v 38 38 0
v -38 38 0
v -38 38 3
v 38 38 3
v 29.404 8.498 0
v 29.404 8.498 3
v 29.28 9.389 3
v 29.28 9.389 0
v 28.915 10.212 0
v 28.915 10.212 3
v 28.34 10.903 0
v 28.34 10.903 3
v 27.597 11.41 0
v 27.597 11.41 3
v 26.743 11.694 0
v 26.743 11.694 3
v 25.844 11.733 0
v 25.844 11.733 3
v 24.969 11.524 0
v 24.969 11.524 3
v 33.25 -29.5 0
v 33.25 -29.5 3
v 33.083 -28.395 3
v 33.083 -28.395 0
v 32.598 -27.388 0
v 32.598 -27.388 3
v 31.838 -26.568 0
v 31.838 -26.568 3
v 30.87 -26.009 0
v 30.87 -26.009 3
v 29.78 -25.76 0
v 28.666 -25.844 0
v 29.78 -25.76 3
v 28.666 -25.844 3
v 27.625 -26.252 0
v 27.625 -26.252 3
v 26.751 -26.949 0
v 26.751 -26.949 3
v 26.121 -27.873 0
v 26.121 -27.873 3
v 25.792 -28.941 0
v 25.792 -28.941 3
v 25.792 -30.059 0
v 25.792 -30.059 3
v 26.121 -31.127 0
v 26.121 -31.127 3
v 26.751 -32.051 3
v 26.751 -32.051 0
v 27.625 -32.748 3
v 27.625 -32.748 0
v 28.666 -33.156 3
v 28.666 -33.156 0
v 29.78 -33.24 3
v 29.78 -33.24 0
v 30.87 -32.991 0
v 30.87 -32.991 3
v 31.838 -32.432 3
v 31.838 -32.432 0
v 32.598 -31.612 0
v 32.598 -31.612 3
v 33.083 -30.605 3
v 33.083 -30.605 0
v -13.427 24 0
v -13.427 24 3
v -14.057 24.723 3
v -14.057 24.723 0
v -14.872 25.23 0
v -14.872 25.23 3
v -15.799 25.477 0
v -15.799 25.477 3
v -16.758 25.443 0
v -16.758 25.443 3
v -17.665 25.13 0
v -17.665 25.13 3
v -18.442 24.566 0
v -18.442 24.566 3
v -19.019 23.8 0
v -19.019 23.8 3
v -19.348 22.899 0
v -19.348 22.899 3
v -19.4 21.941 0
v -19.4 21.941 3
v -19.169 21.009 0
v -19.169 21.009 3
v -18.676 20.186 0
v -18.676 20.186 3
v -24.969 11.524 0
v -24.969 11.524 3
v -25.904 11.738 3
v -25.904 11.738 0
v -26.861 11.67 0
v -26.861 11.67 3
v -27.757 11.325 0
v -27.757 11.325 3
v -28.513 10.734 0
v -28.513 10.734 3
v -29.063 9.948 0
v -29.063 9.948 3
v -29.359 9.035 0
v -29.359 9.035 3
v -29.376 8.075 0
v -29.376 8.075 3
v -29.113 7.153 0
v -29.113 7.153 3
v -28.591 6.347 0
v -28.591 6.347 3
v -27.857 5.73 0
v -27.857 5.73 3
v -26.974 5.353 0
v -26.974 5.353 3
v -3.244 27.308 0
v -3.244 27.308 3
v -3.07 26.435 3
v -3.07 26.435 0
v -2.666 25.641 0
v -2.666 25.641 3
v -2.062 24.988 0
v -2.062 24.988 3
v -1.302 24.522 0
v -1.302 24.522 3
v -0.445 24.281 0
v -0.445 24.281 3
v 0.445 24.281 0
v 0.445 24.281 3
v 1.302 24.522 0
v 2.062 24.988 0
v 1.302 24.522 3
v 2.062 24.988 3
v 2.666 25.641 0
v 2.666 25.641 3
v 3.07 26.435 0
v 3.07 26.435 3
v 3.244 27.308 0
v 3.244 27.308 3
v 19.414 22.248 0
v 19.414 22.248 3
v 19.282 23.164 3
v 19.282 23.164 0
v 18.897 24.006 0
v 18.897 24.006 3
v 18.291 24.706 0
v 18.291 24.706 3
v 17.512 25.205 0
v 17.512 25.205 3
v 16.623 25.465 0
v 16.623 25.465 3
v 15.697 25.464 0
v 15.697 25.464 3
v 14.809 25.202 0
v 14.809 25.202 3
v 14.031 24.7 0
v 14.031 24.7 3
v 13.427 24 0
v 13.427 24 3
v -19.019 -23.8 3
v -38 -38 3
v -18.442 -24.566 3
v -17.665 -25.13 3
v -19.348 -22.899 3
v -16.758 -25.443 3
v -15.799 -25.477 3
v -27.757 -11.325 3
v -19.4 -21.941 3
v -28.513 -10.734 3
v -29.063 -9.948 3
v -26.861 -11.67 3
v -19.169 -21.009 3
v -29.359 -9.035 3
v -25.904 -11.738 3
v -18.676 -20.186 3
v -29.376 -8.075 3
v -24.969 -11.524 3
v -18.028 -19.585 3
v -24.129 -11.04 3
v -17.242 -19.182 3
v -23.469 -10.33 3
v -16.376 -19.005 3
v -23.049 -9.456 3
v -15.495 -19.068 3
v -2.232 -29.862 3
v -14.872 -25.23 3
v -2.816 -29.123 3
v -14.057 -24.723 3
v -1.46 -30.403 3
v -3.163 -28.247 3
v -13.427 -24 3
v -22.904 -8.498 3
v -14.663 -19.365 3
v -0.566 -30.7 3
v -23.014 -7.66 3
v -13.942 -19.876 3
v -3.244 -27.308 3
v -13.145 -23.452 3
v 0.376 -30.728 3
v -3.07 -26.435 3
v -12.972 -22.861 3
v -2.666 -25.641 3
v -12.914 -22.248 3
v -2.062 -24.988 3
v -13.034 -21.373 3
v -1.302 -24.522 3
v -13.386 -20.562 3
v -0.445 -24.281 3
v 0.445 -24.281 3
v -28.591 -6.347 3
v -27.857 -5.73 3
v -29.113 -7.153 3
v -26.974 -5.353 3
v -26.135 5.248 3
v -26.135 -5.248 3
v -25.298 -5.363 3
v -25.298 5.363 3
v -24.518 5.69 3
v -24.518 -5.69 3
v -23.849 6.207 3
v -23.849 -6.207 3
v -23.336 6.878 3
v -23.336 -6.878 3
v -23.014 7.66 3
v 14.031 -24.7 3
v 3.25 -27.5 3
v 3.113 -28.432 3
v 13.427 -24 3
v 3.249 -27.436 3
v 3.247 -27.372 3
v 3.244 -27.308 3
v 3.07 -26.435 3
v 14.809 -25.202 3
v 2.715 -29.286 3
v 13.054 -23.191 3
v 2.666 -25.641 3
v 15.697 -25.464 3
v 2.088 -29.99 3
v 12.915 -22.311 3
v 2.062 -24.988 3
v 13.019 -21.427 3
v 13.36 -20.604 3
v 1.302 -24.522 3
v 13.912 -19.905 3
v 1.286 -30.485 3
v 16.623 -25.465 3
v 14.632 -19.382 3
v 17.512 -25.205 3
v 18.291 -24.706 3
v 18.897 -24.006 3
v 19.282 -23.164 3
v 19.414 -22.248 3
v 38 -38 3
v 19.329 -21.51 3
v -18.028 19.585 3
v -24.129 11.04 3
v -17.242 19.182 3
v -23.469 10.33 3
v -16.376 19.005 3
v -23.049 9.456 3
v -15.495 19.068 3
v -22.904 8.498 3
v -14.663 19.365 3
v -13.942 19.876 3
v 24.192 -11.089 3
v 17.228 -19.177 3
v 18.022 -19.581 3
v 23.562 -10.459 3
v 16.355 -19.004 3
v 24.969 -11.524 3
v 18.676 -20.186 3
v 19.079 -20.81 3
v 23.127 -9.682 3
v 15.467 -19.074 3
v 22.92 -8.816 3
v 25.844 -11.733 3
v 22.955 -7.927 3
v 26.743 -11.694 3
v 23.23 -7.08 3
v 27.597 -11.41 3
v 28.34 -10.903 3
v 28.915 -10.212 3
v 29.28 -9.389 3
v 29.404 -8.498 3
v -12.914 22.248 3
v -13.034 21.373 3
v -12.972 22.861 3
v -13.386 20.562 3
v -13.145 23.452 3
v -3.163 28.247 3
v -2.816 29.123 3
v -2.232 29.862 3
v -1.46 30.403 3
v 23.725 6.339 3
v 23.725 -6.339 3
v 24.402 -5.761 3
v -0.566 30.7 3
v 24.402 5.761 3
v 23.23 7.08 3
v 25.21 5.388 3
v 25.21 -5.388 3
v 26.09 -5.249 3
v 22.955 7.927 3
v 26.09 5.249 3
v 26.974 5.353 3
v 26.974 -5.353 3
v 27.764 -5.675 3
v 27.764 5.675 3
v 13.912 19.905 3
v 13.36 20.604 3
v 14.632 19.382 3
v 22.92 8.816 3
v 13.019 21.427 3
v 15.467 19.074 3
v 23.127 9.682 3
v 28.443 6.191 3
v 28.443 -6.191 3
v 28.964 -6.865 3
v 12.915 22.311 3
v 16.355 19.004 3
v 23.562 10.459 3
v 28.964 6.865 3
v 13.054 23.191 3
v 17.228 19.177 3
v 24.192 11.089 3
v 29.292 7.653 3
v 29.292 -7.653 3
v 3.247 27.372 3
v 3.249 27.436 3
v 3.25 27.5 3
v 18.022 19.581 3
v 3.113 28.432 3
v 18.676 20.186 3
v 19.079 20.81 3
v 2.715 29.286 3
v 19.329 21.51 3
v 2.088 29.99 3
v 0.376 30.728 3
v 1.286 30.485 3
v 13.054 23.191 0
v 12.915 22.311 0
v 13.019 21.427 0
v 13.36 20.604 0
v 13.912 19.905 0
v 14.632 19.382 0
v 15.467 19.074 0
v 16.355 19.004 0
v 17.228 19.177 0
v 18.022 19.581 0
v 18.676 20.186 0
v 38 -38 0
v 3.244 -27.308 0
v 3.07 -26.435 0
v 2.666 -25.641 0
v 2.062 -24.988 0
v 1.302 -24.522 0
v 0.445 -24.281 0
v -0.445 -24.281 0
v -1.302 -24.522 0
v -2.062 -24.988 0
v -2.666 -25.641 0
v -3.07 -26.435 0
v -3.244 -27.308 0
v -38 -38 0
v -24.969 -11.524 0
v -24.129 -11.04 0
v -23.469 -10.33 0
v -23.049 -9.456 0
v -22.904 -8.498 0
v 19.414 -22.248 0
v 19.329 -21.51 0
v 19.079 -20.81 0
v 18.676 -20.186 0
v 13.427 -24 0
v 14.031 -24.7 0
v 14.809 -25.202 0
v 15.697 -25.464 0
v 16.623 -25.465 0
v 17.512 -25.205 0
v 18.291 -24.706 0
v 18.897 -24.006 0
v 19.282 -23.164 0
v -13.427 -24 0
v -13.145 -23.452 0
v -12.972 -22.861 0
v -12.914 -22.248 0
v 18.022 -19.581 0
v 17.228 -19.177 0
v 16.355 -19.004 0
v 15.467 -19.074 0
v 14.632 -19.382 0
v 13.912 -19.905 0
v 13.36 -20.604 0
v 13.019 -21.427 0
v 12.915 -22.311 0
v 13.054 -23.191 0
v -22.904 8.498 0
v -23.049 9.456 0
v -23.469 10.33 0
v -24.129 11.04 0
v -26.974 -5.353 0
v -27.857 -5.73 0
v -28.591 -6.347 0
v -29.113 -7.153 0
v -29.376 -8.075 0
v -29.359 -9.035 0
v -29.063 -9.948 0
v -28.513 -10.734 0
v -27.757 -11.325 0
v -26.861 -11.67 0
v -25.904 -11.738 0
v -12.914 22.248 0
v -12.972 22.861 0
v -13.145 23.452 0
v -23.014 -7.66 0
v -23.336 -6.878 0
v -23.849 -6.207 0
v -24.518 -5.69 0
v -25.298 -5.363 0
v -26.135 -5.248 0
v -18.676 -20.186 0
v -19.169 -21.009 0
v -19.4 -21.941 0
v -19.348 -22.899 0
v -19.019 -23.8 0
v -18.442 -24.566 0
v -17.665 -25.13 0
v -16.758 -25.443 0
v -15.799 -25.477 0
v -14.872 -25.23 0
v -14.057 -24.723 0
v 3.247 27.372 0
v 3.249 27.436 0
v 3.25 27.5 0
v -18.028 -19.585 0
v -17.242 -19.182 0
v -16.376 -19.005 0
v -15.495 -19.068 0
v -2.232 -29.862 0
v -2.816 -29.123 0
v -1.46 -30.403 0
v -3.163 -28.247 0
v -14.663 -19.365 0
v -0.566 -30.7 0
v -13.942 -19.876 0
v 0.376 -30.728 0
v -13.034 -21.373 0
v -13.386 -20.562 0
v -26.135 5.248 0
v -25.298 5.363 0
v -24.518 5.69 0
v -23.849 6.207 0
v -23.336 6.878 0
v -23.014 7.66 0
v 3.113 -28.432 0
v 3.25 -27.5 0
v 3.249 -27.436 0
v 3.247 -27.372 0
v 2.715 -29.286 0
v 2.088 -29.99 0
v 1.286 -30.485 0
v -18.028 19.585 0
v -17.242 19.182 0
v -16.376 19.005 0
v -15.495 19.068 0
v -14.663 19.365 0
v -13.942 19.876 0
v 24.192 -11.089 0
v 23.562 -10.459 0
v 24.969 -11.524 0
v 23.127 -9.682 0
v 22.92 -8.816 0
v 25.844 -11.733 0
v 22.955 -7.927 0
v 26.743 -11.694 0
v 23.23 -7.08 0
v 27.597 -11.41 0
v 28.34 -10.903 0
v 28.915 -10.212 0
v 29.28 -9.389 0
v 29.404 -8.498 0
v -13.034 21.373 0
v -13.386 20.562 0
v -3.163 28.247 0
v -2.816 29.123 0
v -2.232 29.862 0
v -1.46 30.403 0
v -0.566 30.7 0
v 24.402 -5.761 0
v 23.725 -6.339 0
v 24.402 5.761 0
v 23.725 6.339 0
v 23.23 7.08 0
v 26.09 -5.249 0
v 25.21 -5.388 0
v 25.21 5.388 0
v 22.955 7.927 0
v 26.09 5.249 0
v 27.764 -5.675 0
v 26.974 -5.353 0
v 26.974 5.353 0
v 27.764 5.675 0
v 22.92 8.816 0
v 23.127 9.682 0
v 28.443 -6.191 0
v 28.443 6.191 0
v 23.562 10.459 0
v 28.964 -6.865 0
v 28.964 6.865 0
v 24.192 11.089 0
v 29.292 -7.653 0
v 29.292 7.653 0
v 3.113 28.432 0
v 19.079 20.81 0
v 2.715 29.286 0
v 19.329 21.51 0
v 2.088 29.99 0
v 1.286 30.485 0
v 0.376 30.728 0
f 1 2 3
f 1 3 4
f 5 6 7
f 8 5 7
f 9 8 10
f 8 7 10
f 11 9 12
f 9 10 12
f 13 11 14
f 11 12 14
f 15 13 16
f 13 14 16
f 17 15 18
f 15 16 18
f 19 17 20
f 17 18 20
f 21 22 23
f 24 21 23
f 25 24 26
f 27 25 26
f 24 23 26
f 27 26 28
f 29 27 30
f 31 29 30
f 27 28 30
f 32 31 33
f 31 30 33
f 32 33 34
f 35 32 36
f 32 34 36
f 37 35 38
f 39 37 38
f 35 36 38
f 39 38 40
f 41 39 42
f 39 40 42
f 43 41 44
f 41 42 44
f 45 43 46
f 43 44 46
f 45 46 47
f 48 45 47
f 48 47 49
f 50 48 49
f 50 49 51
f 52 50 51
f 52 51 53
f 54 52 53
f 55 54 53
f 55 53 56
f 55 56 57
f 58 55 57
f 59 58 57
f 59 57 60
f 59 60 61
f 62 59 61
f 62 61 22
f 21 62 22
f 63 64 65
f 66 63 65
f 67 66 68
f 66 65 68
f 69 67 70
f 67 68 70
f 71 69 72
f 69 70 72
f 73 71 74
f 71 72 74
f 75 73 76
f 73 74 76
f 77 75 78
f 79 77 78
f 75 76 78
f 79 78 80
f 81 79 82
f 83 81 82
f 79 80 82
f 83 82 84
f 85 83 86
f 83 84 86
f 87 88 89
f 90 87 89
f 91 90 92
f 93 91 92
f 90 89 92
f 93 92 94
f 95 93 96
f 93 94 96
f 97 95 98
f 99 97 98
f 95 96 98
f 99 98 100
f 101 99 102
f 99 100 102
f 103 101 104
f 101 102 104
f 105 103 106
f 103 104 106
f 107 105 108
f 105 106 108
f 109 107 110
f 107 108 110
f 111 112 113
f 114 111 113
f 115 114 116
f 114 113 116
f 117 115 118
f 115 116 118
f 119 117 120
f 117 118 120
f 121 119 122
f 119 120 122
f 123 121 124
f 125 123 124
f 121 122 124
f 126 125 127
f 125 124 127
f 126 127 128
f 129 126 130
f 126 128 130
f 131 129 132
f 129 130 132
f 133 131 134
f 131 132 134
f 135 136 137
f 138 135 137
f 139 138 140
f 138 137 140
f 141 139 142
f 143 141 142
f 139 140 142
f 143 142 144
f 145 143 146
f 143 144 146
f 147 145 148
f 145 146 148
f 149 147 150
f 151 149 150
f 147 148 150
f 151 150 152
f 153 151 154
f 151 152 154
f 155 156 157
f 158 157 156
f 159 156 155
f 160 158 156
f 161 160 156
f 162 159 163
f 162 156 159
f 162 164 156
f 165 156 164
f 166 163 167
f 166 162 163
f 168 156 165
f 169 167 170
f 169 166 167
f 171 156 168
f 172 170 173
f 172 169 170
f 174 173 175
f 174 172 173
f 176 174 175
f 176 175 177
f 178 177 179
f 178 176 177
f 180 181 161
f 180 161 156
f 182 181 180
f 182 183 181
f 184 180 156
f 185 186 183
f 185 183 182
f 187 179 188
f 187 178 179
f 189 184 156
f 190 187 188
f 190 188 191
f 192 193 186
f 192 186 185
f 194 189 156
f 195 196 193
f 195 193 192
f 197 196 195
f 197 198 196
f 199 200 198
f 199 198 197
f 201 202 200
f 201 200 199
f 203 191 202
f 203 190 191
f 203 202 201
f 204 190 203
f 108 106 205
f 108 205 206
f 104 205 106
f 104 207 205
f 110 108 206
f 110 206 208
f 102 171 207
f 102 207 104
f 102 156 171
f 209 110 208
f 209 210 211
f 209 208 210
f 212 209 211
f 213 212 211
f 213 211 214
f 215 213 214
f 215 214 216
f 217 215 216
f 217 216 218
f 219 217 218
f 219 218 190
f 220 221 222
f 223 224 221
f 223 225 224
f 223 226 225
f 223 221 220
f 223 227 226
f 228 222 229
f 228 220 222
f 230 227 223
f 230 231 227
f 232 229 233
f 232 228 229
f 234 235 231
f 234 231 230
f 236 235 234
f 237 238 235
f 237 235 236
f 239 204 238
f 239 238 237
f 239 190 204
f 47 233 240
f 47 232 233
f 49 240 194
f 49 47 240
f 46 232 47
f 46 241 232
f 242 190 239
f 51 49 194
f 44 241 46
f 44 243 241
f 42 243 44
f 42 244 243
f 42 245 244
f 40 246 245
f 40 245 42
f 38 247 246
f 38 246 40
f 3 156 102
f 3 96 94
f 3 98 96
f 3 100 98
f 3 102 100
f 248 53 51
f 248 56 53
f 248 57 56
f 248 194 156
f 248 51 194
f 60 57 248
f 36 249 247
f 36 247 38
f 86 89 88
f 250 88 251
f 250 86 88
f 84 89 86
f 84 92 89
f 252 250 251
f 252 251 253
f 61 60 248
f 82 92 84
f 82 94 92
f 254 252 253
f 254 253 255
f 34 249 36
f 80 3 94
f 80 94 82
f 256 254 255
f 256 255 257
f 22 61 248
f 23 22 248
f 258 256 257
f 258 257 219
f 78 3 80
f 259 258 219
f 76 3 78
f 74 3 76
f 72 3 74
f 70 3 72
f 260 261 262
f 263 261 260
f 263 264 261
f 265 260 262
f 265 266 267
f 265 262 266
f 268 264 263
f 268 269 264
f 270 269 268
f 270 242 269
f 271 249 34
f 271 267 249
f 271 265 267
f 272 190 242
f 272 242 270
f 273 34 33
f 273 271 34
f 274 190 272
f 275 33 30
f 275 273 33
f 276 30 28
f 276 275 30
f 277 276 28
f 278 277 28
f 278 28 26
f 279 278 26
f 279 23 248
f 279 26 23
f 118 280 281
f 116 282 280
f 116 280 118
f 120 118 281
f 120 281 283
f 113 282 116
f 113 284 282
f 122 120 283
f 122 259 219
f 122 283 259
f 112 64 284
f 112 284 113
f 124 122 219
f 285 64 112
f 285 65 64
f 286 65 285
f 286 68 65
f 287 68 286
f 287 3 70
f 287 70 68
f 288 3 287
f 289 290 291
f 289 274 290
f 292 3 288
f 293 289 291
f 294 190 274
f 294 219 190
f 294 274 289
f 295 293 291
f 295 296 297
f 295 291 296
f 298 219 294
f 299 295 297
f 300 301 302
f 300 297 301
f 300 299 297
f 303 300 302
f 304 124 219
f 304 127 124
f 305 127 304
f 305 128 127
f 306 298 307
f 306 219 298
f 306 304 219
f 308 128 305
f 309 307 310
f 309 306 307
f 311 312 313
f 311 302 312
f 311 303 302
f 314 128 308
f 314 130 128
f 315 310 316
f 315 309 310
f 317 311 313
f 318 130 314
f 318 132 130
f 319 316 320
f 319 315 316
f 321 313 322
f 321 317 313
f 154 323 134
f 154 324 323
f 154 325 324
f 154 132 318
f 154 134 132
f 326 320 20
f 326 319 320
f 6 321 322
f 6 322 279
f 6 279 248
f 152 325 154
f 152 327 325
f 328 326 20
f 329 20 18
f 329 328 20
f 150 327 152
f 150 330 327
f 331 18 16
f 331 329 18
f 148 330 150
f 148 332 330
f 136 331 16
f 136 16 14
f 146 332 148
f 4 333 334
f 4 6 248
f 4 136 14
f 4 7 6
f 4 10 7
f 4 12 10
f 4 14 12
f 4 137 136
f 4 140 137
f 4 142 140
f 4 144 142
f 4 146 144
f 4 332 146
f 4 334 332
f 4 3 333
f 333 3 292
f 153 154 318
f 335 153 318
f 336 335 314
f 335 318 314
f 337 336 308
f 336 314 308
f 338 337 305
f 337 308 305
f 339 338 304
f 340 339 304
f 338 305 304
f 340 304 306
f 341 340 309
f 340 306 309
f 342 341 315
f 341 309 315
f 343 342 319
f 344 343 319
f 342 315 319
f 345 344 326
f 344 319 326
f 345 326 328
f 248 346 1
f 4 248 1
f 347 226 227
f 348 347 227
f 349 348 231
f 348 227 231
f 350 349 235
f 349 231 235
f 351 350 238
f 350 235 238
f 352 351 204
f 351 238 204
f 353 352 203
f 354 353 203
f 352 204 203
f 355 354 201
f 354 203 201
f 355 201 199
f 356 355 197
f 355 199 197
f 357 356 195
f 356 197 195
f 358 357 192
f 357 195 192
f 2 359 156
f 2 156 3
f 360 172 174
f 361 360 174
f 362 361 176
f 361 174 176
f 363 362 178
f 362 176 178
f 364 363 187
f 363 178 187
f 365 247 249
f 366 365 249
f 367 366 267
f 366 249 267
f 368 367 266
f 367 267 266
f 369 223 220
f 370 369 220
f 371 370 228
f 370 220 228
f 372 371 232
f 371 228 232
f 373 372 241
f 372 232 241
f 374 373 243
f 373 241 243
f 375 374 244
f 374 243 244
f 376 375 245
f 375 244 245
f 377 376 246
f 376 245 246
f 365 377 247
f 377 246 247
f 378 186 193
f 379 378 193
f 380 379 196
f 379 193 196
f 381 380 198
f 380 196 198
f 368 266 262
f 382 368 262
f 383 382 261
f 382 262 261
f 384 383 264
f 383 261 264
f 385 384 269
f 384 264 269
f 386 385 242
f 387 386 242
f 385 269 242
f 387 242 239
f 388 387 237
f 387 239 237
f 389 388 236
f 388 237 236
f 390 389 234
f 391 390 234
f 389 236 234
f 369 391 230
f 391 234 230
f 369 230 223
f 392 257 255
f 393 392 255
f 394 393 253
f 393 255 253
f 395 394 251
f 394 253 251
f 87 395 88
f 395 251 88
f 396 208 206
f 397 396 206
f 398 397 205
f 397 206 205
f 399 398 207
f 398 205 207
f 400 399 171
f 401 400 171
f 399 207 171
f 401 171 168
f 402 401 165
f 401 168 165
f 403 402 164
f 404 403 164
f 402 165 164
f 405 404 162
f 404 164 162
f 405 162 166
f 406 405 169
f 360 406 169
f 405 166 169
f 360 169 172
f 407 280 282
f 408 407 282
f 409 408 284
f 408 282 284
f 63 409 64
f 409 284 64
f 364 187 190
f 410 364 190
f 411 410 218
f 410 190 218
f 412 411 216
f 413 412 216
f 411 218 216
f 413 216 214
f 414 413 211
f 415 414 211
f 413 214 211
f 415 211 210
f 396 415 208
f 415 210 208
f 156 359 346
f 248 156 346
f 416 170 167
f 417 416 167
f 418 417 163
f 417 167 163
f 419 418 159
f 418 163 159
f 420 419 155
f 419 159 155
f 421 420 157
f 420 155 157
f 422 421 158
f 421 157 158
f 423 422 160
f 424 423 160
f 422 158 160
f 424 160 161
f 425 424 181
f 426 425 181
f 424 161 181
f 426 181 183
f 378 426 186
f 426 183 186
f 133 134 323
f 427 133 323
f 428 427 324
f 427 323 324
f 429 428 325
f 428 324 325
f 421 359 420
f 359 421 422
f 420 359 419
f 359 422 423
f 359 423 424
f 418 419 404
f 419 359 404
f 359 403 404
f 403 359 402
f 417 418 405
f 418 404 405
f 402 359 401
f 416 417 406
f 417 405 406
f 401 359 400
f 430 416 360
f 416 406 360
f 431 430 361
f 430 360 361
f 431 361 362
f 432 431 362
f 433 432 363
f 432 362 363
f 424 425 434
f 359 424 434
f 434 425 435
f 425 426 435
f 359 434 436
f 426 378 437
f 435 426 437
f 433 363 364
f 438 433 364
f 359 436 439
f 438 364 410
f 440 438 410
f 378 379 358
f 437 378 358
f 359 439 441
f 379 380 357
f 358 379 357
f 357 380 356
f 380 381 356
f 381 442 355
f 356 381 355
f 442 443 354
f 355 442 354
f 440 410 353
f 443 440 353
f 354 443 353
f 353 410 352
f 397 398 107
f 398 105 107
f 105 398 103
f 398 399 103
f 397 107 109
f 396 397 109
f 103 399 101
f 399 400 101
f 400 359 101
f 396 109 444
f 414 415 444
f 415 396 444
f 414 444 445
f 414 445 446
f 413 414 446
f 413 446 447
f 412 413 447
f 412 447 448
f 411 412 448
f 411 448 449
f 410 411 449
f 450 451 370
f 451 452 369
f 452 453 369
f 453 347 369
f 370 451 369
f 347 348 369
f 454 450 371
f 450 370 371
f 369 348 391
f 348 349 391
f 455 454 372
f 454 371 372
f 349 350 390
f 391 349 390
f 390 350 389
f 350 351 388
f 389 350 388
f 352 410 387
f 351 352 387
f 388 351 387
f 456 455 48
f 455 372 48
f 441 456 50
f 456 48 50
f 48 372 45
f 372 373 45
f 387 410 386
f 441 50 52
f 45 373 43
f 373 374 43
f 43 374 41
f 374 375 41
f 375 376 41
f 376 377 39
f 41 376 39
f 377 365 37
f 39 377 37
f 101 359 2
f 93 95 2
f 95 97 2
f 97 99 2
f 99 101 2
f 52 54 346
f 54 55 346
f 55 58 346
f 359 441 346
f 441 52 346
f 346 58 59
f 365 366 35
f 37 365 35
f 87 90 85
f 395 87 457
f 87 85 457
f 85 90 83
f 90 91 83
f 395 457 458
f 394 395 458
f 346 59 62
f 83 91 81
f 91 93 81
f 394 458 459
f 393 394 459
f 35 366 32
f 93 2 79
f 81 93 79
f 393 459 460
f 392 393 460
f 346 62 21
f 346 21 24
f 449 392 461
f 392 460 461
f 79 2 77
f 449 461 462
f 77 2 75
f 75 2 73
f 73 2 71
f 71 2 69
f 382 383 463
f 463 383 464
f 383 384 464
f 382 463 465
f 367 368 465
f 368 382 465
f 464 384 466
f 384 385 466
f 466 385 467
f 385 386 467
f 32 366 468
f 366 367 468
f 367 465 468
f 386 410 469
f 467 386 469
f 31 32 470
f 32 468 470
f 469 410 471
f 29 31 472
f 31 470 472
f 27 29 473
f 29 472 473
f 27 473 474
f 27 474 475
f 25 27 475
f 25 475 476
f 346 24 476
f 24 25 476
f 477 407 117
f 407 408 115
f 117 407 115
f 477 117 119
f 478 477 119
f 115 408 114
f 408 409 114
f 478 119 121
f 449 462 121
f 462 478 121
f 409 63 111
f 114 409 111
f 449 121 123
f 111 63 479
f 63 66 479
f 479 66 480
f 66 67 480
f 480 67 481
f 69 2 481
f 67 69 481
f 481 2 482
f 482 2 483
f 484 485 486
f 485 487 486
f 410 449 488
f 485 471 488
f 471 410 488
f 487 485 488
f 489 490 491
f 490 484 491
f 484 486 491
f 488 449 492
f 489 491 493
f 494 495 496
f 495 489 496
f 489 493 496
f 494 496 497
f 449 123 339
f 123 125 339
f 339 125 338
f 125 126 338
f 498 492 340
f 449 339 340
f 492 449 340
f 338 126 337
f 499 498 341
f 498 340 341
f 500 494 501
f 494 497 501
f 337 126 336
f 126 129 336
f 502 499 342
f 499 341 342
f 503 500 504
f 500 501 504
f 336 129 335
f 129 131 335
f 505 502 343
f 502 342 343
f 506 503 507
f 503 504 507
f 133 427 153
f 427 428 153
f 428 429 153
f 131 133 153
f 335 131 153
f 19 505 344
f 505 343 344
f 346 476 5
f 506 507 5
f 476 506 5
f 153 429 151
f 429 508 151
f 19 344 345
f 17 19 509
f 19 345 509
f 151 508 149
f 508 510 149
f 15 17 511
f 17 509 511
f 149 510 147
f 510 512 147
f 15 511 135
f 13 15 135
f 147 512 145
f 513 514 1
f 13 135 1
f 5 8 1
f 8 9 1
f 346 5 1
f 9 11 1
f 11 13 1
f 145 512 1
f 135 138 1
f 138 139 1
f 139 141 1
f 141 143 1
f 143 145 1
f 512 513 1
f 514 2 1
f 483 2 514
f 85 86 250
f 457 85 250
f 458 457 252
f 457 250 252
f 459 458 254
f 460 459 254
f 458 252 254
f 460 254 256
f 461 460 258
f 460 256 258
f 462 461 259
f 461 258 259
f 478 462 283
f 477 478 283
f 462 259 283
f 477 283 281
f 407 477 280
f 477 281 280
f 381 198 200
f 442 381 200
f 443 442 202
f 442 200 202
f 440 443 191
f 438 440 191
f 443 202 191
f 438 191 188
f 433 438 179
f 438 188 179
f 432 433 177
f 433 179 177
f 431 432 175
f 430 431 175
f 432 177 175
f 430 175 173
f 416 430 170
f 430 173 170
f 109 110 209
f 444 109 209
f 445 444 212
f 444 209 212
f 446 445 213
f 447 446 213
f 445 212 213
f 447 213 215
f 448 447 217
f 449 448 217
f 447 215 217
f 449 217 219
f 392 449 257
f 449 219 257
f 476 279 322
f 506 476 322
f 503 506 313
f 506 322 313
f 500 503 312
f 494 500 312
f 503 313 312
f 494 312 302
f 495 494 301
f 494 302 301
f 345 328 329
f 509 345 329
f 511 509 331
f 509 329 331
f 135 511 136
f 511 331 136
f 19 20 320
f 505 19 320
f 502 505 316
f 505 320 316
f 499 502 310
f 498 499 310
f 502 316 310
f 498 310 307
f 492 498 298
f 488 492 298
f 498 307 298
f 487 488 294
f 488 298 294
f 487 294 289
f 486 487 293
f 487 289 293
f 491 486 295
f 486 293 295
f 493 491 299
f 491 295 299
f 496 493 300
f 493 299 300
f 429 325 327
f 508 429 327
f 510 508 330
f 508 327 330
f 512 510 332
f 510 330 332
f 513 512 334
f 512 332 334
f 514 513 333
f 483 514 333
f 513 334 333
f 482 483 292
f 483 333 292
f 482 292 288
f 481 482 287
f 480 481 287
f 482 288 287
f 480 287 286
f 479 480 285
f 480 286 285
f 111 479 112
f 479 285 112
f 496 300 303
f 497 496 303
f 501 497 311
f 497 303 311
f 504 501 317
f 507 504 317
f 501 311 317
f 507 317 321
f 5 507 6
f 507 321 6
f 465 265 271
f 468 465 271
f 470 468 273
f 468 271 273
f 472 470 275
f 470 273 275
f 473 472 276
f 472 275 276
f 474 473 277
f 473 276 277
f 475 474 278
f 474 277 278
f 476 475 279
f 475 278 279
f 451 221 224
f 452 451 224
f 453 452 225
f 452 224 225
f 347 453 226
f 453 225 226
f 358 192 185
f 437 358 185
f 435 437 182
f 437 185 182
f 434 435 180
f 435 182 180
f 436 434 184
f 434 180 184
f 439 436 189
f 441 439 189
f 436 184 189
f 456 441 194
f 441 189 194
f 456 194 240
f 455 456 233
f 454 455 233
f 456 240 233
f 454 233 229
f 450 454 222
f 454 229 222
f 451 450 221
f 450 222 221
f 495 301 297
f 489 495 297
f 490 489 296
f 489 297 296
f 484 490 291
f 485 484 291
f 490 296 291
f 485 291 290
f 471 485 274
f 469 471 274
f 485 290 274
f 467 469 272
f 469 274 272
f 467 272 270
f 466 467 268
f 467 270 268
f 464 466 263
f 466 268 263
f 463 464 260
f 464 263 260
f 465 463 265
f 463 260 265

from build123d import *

# Parameters (mm, degrees)
F0_W     = 76
F0_H     = 76
F1_DEPTH = 3
F3_DEPTH = 25
F4_R     = 3.75
F5_DEPTH = 25


with BuildPart() as f1:
    # F0 (on Top) → F1 (new body)
    with BuildSketch(Plane.XY):
        Rectangle(F0_W, F0_H)
    extrude(amount=F1_DEPTH)

    # F2 (on face) → F3 (cut)
    with BuildSketch(Plane.XY.offset(3)):
        with BuildLine():
            ThreePointArc((24.9688578028, 11.5241546337), (23.0631205202, 7.4936621136), (26.9739584315, 5.3530894386))
            ThreePointArc((26.9739584315, 5.3530894386), (26.1540541981, 8.4979673453), (24.9688578028, 11.5241546337))
        make_face()
        with BuildLine():
            ThreePointArc((24.9688578028, 11.5241546337), (26.1540541981, 8.4979673453), (26.9739584315, 5.3530894386))
            ThreePointArc((26.9739584315, 5.3530894386), (28.7257451553, 6.5107819939), (29.4040541981, 8.4979673453))
            ThreePointArc((29.4040541981, 8.4979673453), (27.9858035963, 11.1825891329), (24.9688578028, 11.5241546337))
        make_face()
        with BuildLine():
            ThreePointArc((29.4040541981, -8.4979673453), (28.7257451553, -6.5107819939), (26.9739584315, -5.3530894386))
            ThreePointArc((26.9739584315, -5.3530894386), (26.1540541981, -8.4979673453), (24.9688578028, -11.5241546337))
            ThreePointArc((24.9688578028, -11.5241546337), (27.9858035963, -11.1825891329), (29.4040541981, -8.4979673453))
        make_face()
        with BuildLine():
            ThreePointArc((24.9688578028, -11.5241546337), (26.1540541981, -8.4979673453), (26.9739584315, -5.3530894386))
            ThreePointArc((26.9739584315, -5.3530894386), (23.0631205202, -7.4936621136), (24.9688578028, -11.5241546337))
        make_face()
        with BuildLine():
            ThreePointArc((13.4265021538, 23.9995633276), (14.2537923681, 19.6186621136), (18.6759237504, 20.1856352902))
            ThreePointArc((18.6759237504, 20.1856352902), (16.164094438, 22.2479673453), (13.4265021538, 23.9995633276))
        make_face()
        with BuildLine():
            ThreePointArc((13.4265021538, 23.9995633276), (16.164094438, 22.2479673453), (18.6759237504, 20.1856352902))
            ThreePointArc((18.6759237504, 20.1856352902), (19.2239919253, 21.1527379778), (19.414094438, 22.2479673453))
            ThreePointArc((19.414094438, 22.2479673453), (17.0765978836, 25.3672360836), (13.4265021538, 23.9995633276))
        make_face()
        with BuildLine():
            ThreePointArc((19.414094438, -22.2479673453), (19.2239919253, -21.1527379778), (18.6759237504, -20.1856352902))
            ThreePointArc((18.6759237504, -20.1856352902), (16.164094438, -22.2479673453), (13.4265021538, -23.9995633276))
            ThreePointArc((13.4265021538, -23.9995633276), (17.0765978836, -25.3672360836), (19.414094438, -22.2479673453))
        make_face()
        with BuildLine():
            ThreePointArc((13.4265021538, -23.9995633276), (16.164094438, -22.2479673453), (18.6759237504, -20.1856352902))
            ThreePointArc((18.6759237504, -20.1856352902), (14.2537923681, -19.6186621136), (13.4265021538, -23.9995633276))
        make_face()
        with BuildLine():
            ThreePointArc((-3.244320968, 27.3079545455), (0, 24.25), (3.244320968, 27.3079545455))
            ThreePointArc((3.244320968, 27.3079545455), (0, 27.5), (-3.244320968, 27.3079545455))
        make_face()
        with BuildLine():
            ThreePointArc((-3.244320968, 27.3079545455), (0, 27.5), (3.244320968, 27.3079545455))
            ThreePointArc((3.244320968, 27.3079545455), (3.2485799318, 27.4039352978), (3.25, 27.5))
            ThreePointArc((3.25, 27.5), (-0.0960647022, 30.7485799318), (-3.244320968, 27.3079545455))
        make_face()
        with BuildLine():
            ThreePointArc((3.25, -27.5), (3.2485799318, -27.4039352978), (3.244320968, -27.3079545455))
            ThreePointArc((3.244320968, -27.3079545455), (0, -27.5), (-3.244320968, -27.3079545455))
            ThreePointArc((-3.244320968, -27.3079545455), (-0.0960647022, -30.7485799318), (3.25, -27.5))
        make_face()
        with BuildLine():
            ThreePointArc((-3.244320968, -27.3079545455), (0, -27.5), (3.244320968, -27.3079545455))
            ThreePointArc((3.244320968, -27.3079545455), (0, -24.25), (-3.244320968, -27.3079545455))
        make_face()
        with BuildLine():
            ThreePointArc((-12.914094438, 22.2479673453), (-13.0448256997, 23.1604707908), (-13.4265021538, 23.9995633276))
            ThreePointArc((-13.4265021538, 23.9995633276), (-16.164094438, 22.2479673453), (-18.6759237504, 20.1856352902))
            ThreePointArc((-18.6759237504, 20.1856352902), (-15.0688650706, 19.188069858), (-12.914094438, 22.2479673453))
        make_face()
        with BuildLine():
            ThreePointArc((-18.6759237504, 20.1856352902), (-16.164094438, 22.2479673453), (-13.4265021538, 23.9995633276))
            ThreePointArc((-13.4265021538, 23.9995633276), (-18.074396508, 24.877272577), (-18.6759237504, 20.1856352902))
        make_face()
        with BuildLine():
            ThreePointArc((-18.6759237504, -20.1856352902), (-18.074396508, -24.877272577), (-13.4265021538, -23.9995633276))
            ThreePointArc((-13.4265021538, -23.9995633276), (-16.164094438, -22.2479673453), (-18.6759237504, -20.1856352902))
        make_face()
        with BuildLine():
            ThreePointArc((-18.6759237504, -20.1856352902), (-16.164094438, -22.2479673453), (-13.4265021538, -23.9995633276))
            ThreePointArc((-13.4265021538, -23.9995633276), (-13.0448256997, -23.1604707908), (-12.914094438, -22.2479673453))
            ThreePointArc((-12.914094438, -22.2479673453), (-15.0688650706, -19.188069858), (-18.6759237504, -20.1856352902))
        make_face()
        with BuildLine():
            ThreePointArc((-22.9040541981, 8.4979673453), (-23.4694324105, 10.3297167435), (-24.9688578028, 11.5241546337))
            ThreePointArc((-24.9688578028, 11.5241546337), (-26.1540541981, 8.4979673453), (-26.9739584315, 5.3530894386))
            ThreePointArc((-26.9739584315, 5.3530894386), (-24.1668688467, 5.9262763881), (-22.9040541981, 8.4979673453))
        make_face()
        with BuildLine():
            ThreePointArc((-26.9739584315, 5.3530894386), (-26.1540541981, 8.4979673453), (-24.9688578028, 11.5241546337))
            ThreePointArc((-24.9688578028, 11.5241546337), (-29.2449878761, 9.502272577), (-26.9739584315, 5.3530894386))
        make_face()
        with BuildLine():
            ThreePointArc((-26.9739584315, -5.3530894386), (-29.2449878761, -9.502272577), (-24.9688578028, -11.5241546337))
            ThreePointArc((-24.9688578028, -11.5241546337), (-26.1540541981, -8.4979673453), (-26.9739584315, -5.3530894386))
        make_face()
        with BuildLine():
            ThreePointArc((-26.9739584315, -5.3530894386), (-26.1540541981, -8.4979673453), (-24.9688578028, -11.5241546337))
            ThreePointArc((-24.9688578028, -11.5241546337), (-23.4694324105, -10.3297167435), (-22.9040541981, -8.4979673453))
            ThreePointArc((-22.9040541981, -8.4979673453), (-24.1668688467, -5.9262763881), (-26.9739584315, -5.3530894386))
        make_face()
    extrude(amount=-F3_DEPTH, mode=Mode.SUBTRACT)

    # F4 (on face) → F5 (cut)
    with BuildSketch(Plane.XY.offset(3)):
        with Locations((29.5, -29.5)):
            Circle(F4_R)
    extrude(amount=-F5_DEPTH, mode=Mode.SUBTRACT)


solid = f1.part
